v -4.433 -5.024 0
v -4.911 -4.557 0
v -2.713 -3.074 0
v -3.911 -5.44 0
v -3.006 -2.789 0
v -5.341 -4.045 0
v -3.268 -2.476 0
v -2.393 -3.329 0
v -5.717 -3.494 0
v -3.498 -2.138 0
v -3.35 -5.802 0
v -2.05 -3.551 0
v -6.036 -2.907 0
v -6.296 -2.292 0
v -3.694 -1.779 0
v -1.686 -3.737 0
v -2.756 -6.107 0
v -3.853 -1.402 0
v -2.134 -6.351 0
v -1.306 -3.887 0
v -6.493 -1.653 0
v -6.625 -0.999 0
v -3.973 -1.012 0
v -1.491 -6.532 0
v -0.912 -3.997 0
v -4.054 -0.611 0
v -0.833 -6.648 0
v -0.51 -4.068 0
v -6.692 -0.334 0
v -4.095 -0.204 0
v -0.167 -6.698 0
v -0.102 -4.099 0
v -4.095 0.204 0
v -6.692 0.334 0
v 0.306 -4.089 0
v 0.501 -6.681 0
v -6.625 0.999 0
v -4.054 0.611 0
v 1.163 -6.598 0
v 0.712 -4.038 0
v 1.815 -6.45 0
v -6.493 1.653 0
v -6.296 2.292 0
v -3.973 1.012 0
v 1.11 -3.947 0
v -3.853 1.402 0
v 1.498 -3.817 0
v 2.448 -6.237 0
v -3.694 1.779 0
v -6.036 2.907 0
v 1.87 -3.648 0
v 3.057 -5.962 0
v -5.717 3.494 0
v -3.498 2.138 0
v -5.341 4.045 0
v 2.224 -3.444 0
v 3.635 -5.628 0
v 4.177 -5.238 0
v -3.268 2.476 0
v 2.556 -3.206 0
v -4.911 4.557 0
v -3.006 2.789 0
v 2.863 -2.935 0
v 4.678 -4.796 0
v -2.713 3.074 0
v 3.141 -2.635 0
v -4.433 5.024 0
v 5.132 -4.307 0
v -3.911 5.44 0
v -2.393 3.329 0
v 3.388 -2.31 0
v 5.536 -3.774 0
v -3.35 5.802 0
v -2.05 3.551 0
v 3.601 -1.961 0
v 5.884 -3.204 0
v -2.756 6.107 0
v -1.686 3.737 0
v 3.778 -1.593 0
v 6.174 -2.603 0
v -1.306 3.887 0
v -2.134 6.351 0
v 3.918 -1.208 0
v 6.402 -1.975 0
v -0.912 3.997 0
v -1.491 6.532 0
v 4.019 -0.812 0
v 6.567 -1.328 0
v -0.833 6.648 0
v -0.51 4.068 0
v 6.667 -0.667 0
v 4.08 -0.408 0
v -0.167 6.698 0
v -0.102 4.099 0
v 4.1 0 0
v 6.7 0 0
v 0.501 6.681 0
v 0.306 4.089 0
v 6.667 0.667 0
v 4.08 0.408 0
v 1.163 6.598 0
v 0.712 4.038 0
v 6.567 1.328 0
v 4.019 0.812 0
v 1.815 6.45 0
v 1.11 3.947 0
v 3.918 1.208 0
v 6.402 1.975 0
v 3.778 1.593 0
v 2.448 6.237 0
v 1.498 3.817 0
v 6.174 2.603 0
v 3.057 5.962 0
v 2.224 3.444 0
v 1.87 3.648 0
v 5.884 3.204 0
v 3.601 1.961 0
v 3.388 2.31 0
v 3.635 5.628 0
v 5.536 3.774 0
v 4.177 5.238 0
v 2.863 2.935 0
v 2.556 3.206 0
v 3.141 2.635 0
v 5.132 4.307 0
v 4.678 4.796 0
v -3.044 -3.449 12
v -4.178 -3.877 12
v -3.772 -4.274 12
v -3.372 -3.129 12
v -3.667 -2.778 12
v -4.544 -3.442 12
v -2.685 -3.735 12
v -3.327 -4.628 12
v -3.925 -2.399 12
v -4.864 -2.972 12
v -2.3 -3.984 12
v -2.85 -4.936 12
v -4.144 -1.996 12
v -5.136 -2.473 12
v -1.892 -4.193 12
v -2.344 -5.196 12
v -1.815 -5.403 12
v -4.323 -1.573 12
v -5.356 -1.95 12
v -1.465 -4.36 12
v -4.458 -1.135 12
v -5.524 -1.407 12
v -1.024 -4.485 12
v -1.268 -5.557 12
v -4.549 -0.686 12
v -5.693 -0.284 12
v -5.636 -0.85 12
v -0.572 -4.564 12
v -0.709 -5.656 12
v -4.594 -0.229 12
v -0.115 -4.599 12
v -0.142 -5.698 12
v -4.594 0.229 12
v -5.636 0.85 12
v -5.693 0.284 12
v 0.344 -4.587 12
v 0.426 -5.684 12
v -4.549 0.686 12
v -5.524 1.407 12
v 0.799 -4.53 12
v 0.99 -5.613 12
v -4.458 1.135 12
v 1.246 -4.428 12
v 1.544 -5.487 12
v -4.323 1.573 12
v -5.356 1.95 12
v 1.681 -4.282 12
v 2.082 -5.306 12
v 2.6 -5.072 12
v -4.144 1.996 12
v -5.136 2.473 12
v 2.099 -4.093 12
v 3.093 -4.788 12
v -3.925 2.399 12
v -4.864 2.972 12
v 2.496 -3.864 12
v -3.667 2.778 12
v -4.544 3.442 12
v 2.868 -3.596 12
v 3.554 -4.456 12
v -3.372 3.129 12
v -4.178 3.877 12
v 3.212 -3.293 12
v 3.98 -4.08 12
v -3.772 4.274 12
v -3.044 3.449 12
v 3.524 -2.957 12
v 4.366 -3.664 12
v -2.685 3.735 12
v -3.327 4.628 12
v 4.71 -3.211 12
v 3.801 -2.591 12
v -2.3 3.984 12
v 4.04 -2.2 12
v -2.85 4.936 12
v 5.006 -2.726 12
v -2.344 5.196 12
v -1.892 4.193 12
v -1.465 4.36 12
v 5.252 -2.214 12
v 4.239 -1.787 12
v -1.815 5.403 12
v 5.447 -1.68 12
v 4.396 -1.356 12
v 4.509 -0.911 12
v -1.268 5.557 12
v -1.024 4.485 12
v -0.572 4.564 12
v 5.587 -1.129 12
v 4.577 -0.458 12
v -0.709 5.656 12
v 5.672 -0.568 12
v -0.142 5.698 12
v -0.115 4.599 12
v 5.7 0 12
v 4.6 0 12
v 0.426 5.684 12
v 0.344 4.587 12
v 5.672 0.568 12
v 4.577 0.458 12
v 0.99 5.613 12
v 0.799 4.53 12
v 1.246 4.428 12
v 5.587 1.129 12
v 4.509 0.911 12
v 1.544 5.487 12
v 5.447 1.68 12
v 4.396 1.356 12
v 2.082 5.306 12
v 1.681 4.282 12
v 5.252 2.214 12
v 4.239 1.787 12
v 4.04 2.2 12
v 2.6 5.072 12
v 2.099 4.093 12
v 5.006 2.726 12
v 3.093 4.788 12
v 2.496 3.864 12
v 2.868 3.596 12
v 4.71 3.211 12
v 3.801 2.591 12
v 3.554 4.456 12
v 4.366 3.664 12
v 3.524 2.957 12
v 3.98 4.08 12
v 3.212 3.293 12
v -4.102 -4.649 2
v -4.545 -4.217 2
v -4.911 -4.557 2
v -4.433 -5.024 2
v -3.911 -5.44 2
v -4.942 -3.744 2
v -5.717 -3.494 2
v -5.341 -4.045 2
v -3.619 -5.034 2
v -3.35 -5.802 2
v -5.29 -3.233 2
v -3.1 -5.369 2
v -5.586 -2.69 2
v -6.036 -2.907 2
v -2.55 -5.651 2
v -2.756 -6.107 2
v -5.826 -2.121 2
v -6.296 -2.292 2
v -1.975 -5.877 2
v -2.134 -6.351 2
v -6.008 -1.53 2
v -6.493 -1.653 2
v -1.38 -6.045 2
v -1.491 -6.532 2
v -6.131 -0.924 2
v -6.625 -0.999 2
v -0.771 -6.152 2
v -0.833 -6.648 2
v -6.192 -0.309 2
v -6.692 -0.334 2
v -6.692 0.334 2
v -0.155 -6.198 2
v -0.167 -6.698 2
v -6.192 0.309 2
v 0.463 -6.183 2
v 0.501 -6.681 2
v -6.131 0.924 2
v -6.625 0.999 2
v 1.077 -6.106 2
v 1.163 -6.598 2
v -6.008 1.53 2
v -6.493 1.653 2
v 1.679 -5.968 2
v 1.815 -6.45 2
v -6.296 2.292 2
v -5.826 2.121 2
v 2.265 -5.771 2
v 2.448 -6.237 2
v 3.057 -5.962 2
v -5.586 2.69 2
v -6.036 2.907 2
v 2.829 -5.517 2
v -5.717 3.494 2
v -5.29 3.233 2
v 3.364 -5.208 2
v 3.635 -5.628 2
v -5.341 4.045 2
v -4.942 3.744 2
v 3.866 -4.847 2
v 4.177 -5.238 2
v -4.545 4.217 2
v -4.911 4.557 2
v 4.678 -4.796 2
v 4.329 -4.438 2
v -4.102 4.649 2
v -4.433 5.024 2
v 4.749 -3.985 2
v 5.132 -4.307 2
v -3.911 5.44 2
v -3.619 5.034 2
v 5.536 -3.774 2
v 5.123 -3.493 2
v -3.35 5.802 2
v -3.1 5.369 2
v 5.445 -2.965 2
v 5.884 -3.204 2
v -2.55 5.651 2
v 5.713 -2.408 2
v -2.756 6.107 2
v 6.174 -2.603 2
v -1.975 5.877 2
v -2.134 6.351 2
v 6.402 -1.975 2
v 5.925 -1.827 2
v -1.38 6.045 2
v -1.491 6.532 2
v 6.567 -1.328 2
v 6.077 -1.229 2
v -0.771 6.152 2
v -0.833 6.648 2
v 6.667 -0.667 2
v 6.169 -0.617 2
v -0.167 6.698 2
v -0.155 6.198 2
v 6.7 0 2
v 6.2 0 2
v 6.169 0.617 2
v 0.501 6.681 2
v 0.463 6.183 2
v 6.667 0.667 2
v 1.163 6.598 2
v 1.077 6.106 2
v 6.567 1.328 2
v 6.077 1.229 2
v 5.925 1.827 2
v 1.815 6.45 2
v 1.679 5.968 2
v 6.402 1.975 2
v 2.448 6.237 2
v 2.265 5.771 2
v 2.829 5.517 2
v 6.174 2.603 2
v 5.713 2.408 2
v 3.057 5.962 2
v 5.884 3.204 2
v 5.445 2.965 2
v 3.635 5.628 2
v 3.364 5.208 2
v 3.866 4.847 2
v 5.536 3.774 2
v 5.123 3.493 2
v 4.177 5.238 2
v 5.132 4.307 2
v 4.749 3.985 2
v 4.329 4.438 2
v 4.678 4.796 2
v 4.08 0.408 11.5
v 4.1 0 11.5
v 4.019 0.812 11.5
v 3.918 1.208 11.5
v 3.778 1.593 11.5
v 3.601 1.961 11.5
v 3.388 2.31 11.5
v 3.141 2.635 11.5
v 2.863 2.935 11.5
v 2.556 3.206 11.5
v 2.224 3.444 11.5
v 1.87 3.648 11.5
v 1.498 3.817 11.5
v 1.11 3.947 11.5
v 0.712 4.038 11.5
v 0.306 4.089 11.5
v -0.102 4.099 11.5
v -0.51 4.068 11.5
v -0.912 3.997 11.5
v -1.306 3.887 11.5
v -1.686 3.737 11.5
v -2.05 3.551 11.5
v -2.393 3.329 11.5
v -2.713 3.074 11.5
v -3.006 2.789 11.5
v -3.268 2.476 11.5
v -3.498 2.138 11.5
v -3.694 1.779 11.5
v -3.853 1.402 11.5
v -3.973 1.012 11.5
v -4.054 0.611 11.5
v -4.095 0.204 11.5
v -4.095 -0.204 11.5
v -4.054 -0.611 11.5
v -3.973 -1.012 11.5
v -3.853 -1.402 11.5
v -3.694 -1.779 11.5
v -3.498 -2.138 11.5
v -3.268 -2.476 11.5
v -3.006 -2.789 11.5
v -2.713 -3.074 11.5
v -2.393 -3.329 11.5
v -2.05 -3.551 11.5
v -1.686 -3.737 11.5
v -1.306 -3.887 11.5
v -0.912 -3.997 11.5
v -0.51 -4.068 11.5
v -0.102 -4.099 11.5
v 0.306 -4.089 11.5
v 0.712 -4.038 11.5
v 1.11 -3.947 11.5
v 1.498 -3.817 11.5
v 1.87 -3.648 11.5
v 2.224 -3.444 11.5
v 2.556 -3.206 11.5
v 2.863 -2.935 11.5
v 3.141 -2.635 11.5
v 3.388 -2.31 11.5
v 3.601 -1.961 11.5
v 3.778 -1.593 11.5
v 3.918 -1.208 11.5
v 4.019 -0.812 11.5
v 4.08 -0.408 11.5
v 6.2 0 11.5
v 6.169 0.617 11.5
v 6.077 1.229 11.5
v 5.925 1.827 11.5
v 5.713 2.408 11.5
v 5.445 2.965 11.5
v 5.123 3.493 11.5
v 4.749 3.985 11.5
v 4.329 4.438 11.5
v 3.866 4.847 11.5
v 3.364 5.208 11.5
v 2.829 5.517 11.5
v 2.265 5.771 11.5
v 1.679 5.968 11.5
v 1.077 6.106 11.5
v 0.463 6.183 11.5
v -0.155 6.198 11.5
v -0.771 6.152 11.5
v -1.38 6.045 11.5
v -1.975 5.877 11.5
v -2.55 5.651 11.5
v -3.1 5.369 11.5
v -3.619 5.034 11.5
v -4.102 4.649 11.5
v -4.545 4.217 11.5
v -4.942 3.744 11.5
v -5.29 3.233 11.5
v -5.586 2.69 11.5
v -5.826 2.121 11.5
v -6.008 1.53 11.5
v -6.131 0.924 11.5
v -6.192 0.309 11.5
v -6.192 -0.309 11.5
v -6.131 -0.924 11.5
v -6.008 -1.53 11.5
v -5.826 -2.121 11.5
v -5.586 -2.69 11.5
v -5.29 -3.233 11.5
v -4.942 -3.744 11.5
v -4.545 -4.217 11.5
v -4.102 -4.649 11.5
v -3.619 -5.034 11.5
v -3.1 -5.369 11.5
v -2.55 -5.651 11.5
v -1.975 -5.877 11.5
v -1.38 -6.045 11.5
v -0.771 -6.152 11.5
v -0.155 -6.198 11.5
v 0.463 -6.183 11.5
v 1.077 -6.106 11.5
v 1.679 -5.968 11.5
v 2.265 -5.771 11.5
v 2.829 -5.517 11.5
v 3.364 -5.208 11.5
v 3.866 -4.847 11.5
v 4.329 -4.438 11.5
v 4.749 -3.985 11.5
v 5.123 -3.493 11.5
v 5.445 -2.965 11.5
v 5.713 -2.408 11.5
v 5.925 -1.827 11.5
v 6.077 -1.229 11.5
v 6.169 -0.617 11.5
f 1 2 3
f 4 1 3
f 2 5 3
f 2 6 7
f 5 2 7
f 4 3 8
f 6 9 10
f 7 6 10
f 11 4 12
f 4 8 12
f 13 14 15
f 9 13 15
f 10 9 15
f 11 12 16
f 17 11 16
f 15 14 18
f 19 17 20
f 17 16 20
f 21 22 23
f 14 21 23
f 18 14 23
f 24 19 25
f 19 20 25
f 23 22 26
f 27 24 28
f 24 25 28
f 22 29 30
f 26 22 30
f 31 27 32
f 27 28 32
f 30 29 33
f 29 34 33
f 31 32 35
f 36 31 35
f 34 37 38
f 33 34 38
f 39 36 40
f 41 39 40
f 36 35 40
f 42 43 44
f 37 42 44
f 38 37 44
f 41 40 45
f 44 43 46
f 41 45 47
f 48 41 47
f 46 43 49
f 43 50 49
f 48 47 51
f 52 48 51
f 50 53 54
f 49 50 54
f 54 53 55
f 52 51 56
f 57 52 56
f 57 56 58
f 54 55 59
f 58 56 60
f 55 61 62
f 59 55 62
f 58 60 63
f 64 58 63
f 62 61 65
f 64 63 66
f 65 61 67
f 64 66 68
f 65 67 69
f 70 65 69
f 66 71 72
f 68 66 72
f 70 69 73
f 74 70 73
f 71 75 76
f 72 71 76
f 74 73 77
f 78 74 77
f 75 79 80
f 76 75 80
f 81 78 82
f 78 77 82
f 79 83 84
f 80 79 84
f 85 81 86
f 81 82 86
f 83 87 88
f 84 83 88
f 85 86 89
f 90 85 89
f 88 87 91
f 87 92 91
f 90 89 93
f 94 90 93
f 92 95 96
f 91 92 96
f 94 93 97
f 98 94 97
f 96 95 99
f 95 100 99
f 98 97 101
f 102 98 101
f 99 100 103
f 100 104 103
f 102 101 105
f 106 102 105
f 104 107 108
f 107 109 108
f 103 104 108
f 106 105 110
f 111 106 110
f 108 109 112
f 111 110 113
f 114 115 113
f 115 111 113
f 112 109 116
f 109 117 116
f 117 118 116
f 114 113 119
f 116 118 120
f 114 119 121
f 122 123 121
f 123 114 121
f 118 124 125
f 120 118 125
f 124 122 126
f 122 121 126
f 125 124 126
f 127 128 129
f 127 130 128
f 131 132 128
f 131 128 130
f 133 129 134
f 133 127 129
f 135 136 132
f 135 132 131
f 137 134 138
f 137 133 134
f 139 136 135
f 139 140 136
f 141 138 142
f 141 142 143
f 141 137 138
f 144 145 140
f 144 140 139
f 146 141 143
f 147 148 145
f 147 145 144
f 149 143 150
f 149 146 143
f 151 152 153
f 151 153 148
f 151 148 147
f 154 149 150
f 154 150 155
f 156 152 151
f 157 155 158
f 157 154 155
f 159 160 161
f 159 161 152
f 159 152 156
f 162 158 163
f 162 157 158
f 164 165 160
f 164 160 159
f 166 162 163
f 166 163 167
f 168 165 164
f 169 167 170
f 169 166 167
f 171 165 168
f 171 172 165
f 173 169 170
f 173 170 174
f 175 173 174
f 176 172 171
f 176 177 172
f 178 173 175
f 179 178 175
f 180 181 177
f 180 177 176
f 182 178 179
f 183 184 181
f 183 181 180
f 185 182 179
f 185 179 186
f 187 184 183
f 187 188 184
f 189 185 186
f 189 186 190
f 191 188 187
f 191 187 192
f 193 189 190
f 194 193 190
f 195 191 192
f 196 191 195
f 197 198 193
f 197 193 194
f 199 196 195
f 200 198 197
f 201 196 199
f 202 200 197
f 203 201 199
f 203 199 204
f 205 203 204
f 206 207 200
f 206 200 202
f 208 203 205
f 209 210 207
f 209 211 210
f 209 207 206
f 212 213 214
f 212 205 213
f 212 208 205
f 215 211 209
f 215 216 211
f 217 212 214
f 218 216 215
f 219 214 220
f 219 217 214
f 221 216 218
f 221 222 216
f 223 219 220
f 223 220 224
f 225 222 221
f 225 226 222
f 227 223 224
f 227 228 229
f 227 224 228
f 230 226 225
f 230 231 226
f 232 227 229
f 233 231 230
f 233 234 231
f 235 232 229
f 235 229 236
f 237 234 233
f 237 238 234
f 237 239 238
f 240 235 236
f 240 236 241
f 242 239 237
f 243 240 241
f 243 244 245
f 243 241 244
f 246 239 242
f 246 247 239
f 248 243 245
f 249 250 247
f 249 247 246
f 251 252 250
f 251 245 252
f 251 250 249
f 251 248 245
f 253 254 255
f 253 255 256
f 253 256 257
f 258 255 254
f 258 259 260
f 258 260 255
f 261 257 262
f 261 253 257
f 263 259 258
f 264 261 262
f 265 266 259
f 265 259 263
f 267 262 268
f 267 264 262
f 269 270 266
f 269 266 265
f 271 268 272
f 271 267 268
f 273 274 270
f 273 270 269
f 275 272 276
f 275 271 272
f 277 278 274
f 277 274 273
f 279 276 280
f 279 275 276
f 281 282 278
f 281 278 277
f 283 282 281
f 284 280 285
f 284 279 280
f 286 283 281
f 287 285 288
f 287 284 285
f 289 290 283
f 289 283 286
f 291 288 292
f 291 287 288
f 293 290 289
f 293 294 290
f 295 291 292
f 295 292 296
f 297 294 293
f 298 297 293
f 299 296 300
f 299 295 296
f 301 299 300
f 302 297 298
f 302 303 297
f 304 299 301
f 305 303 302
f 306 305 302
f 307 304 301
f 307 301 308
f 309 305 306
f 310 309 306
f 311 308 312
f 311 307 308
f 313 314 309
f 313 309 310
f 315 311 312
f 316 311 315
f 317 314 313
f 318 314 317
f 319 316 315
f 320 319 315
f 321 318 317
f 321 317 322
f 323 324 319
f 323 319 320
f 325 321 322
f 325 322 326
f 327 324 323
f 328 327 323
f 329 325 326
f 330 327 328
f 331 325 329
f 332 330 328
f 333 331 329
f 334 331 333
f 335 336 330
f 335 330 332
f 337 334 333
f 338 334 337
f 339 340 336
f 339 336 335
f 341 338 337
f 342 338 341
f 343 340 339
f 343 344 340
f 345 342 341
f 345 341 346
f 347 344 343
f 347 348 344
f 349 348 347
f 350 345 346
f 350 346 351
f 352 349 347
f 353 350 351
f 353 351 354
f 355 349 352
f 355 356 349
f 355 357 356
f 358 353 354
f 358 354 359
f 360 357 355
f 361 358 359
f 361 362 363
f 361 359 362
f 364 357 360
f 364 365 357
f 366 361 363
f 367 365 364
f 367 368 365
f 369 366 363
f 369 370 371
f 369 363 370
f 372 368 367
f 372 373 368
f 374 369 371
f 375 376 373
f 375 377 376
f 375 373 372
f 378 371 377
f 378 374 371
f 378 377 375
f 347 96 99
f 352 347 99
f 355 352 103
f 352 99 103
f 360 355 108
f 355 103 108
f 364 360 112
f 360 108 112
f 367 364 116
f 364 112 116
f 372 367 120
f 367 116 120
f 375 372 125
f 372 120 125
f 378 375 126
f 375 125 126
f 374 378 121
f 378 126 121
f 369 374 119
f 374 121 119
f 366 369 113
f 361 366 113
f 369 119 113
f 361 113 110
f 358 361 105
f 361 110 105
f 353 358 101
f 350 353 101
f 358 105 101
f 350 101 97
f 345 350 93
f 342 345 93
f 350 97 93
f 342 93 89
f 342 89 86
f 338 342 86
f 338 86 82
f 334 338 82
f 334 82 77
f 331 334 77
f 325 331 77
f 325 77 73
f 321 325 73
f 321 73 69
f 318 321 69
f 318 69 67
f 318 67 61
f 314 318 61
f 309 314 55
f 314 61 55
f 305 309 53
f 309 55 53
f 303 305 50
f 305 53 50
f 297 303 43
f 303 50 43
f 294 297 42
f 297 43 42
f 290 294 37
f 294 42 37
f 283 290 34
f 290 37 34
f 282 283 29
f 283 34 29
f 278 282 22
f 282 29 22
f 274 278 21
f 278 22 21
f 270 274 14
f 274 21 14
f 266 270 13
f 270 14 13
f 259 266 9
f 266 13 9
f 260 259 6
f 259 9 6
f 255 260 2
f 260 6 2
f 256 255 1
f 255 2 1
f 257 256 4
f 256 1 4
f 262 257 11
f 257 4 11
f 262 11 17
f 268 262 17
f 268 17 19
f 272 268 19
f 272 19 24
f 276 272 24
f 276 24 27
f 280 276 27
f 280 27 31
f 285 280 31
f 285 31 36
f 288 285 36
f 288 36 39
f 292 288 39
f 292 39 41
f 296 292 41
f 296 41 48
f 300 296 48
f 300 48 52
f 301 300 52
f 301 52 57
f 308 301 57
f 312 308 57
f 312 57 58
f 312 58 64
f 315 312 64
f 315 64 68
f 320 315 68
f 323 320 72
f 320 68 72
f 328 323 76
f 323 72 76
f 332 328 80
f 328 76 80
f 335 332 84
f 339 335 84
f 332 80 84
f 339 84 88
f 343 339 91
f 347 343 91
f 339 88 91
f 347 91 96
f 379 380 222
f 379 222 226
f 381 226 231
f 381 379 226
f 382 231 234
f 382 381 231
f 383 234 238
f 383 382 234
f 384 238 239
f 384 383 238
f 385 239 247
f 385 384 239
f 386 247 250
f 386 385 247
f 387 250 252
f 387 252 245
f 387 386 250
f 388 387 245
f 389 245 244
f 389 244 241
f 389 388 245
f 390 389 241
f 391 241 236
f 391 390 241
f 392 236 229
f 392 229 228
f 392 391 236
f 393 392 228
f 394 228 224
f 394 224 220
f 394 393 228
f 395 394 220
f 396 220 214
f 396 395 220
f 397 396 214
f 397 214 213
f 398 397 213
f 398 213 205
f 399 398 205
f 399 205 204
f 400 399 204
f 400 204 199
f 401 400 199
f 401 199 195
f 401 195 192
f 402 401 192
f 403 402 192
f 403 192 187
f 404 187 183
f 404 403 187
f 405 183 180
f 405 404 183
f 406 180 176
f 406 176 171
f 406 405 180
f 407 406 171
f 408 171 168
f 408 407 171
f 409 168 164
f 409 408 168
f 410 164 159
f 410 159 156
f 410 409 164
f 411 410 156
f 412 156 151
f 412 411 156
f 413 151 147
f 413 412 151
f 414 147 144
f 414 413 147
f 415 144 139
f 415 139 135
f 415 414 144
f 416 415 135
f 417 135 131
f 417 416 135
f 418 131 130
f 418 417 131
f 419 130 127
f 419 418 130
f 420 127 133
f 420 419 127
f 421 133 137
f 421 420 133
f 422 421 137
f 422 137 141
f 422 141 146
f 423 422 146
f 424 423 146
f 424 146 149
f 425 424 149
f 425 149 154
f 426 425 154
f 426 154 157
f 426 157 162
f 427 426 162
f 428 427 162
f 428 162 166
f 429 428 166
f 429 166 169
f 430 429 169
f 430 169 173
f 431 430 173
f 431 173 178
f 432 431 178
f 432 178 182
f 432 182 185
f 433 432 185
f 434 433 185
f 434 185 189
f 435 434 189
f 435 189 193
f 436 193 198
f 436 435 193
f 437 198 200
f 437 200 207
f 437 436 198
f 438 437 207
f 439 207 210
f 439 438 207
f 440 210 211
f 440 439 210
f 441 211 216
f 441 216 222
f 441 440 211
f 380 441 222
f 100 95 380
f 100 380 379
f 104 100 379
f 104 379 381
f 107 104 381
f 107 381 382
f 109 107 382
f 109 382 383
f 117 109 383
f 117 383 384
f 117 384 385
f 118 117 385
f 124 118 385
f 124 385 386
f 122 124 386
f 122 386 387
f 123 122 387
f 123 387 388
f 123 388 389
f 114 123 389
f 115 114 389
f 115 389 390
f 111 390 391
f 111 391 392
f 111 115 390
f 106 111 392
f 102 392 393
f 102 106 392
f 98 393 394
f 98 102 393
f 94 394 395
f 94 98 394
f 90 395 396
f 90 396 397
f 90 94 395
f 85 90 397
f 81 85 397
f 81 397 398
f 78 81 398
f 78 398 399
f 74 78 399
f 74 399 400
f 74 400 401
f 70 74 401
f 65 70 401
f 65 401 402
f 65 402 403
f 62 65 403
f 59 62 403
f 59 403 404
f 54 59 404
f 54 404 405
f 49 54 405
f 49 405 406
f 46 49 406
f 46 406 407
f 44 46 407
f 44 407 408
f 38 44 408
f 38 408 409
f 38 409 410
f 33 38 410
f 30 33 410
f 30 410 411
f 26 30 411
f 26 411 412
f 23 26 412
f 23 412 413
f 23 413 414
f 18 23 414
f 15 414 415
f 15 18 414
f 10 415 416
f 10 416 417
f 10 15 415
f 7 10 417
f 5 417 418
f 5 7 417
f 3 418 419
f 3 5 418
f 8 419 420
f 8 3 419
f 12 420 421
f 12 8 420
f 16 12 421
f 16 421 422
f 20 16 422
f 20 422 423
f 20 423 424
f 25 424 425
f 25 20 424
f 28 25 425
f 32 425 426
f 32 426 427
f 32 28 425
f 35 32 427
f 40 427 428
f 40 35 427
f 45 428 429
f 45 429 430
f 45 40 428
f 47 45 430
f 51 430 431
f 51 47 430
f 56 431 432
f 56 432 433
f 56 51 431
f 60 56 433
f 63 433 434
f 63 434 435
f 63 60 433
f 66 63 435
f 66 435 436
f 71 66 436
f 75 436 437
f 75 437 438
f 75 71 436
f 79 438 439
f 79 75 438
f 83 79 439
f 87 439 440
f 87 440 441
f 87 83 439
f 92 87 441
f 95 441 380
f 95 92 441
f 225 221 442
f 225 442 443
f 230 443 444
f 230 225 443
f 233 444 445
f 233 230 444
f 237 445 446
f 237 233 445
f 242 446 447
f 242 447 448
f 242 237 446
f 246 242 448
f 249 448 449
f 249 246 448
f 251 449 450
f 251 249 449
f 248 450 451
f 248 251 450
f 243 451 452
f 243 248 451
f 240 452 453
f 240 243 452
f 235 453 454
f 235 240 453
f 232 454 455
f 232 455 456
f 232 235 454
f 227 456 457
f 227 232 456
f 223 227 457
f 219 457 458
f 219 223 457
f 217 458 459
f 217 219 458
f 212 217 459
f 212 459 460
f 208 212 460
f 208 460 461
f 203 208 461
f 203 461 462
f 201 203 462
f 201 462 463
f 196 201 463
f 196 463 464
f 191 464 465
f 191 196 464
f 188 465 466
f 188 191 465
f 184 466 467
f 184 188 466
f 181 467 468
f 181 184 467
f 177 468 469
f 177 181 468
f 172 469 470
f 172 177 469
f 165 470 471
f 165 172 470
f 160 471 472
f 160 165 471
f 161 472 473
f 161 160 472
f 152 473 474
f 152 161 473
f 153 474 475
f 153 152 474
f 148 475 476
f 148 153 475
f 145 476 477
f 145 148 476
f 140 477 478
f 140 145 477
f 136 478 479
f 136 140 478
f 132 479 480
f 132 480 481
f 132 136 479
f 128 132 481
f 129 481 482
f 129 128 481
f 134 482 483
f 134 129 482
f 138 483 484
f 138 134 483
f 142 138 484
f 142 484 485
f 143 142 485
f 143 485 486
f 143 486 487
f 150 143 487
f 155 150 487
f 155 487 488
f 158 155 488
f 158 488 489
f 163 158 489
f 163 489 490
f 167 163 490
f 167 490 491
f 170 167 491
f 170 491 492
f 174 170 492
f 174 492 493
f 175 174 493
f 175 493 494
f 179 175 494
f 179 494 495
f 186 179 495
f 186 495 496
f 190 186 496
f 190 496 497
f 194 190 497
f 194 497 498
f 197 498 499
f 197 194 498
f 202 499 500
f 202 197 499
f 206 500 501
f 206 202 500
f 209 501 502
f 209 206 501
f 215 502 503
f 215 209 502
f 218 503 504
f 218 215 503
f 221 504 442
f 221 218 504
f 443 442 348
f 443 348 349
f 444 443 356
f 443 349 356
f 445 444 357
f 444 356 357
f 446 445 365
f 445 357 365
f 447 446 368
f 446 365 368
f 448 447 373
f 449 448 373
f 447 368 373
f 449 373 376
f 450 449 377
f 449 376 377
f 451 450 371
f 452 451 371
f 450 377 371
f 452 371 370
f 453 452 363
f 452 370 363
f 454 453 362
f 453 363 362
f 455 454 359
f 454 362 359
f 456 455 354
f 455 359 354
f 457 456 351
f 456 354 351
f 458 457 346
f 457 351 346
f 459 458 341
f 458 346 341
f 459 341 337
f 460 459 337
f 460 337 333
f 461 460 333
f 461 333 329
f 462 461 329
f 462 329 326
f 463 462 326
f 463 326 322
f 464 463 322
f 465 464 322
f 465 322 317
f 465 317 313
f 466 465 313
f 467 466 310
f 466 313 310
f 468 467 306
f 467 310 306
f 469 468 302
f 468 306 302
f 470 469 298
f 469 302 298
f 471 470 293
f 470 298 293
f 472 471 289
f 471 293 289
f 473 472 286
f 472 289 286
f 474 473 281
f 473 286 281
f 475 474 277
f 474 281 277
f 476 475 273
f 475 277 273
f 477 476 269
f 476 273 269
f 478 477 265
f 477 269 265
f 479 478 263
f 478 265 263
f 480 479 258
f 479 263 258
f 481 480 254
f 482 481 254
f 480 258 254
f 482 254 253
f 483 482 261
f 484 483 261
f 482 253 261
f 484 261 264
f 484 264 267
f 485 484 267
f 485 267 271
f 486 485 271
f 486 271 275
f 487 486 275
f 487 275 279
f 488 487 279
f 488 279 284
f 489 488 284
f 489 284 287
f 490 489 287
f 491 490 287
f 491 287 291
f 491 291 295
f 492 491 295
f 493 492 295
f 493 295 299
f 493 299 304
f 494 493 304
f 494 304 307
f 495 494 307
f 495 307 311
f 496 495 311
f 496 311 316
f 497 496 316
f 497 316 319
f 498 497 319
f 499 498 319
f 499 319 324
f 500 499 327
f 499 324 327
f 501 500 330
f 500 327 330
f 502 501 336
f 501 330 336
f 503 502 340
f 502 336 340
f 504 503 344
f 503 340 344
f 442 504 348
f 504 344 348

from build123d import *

# Parameters (mm, degrees)
F0_R     = 6.7
F0_R_2   = 4.1
F1_DEPTH = 2
F2_R     = 6.2
F2_R_2   = 4.1
F3_DEPTH = 10
F4_SIZE  = 0.5


with BuildPart() as f1:
    # F0 (on Top) → F1 (new body)
    with BuildSketch(Plane.XY):
        Circle(F0_R)
        Circle(F0_R_2, mode=Mode.SUBTRACT)
    extrude(amount=F1_DEPTH)

    # F2 (on face) → F3 (join)
    with BuildSketch(Plane.XY.offset(2)):
        Circle(F2_R)
        Circle(F2_R_2, mode=Mode.SUBTRACT)
    extrude(amount=F3_DEPTH)

    # F4
    f4_edges = [f1.edges().sort_by_distance(p)[0] for p in [
        (-4.1, 0, 12),
        (-6.2, 0, 12),
    ]]
    chamfer(f4_edges, length=F4_SIZE)


solid = f1.part
